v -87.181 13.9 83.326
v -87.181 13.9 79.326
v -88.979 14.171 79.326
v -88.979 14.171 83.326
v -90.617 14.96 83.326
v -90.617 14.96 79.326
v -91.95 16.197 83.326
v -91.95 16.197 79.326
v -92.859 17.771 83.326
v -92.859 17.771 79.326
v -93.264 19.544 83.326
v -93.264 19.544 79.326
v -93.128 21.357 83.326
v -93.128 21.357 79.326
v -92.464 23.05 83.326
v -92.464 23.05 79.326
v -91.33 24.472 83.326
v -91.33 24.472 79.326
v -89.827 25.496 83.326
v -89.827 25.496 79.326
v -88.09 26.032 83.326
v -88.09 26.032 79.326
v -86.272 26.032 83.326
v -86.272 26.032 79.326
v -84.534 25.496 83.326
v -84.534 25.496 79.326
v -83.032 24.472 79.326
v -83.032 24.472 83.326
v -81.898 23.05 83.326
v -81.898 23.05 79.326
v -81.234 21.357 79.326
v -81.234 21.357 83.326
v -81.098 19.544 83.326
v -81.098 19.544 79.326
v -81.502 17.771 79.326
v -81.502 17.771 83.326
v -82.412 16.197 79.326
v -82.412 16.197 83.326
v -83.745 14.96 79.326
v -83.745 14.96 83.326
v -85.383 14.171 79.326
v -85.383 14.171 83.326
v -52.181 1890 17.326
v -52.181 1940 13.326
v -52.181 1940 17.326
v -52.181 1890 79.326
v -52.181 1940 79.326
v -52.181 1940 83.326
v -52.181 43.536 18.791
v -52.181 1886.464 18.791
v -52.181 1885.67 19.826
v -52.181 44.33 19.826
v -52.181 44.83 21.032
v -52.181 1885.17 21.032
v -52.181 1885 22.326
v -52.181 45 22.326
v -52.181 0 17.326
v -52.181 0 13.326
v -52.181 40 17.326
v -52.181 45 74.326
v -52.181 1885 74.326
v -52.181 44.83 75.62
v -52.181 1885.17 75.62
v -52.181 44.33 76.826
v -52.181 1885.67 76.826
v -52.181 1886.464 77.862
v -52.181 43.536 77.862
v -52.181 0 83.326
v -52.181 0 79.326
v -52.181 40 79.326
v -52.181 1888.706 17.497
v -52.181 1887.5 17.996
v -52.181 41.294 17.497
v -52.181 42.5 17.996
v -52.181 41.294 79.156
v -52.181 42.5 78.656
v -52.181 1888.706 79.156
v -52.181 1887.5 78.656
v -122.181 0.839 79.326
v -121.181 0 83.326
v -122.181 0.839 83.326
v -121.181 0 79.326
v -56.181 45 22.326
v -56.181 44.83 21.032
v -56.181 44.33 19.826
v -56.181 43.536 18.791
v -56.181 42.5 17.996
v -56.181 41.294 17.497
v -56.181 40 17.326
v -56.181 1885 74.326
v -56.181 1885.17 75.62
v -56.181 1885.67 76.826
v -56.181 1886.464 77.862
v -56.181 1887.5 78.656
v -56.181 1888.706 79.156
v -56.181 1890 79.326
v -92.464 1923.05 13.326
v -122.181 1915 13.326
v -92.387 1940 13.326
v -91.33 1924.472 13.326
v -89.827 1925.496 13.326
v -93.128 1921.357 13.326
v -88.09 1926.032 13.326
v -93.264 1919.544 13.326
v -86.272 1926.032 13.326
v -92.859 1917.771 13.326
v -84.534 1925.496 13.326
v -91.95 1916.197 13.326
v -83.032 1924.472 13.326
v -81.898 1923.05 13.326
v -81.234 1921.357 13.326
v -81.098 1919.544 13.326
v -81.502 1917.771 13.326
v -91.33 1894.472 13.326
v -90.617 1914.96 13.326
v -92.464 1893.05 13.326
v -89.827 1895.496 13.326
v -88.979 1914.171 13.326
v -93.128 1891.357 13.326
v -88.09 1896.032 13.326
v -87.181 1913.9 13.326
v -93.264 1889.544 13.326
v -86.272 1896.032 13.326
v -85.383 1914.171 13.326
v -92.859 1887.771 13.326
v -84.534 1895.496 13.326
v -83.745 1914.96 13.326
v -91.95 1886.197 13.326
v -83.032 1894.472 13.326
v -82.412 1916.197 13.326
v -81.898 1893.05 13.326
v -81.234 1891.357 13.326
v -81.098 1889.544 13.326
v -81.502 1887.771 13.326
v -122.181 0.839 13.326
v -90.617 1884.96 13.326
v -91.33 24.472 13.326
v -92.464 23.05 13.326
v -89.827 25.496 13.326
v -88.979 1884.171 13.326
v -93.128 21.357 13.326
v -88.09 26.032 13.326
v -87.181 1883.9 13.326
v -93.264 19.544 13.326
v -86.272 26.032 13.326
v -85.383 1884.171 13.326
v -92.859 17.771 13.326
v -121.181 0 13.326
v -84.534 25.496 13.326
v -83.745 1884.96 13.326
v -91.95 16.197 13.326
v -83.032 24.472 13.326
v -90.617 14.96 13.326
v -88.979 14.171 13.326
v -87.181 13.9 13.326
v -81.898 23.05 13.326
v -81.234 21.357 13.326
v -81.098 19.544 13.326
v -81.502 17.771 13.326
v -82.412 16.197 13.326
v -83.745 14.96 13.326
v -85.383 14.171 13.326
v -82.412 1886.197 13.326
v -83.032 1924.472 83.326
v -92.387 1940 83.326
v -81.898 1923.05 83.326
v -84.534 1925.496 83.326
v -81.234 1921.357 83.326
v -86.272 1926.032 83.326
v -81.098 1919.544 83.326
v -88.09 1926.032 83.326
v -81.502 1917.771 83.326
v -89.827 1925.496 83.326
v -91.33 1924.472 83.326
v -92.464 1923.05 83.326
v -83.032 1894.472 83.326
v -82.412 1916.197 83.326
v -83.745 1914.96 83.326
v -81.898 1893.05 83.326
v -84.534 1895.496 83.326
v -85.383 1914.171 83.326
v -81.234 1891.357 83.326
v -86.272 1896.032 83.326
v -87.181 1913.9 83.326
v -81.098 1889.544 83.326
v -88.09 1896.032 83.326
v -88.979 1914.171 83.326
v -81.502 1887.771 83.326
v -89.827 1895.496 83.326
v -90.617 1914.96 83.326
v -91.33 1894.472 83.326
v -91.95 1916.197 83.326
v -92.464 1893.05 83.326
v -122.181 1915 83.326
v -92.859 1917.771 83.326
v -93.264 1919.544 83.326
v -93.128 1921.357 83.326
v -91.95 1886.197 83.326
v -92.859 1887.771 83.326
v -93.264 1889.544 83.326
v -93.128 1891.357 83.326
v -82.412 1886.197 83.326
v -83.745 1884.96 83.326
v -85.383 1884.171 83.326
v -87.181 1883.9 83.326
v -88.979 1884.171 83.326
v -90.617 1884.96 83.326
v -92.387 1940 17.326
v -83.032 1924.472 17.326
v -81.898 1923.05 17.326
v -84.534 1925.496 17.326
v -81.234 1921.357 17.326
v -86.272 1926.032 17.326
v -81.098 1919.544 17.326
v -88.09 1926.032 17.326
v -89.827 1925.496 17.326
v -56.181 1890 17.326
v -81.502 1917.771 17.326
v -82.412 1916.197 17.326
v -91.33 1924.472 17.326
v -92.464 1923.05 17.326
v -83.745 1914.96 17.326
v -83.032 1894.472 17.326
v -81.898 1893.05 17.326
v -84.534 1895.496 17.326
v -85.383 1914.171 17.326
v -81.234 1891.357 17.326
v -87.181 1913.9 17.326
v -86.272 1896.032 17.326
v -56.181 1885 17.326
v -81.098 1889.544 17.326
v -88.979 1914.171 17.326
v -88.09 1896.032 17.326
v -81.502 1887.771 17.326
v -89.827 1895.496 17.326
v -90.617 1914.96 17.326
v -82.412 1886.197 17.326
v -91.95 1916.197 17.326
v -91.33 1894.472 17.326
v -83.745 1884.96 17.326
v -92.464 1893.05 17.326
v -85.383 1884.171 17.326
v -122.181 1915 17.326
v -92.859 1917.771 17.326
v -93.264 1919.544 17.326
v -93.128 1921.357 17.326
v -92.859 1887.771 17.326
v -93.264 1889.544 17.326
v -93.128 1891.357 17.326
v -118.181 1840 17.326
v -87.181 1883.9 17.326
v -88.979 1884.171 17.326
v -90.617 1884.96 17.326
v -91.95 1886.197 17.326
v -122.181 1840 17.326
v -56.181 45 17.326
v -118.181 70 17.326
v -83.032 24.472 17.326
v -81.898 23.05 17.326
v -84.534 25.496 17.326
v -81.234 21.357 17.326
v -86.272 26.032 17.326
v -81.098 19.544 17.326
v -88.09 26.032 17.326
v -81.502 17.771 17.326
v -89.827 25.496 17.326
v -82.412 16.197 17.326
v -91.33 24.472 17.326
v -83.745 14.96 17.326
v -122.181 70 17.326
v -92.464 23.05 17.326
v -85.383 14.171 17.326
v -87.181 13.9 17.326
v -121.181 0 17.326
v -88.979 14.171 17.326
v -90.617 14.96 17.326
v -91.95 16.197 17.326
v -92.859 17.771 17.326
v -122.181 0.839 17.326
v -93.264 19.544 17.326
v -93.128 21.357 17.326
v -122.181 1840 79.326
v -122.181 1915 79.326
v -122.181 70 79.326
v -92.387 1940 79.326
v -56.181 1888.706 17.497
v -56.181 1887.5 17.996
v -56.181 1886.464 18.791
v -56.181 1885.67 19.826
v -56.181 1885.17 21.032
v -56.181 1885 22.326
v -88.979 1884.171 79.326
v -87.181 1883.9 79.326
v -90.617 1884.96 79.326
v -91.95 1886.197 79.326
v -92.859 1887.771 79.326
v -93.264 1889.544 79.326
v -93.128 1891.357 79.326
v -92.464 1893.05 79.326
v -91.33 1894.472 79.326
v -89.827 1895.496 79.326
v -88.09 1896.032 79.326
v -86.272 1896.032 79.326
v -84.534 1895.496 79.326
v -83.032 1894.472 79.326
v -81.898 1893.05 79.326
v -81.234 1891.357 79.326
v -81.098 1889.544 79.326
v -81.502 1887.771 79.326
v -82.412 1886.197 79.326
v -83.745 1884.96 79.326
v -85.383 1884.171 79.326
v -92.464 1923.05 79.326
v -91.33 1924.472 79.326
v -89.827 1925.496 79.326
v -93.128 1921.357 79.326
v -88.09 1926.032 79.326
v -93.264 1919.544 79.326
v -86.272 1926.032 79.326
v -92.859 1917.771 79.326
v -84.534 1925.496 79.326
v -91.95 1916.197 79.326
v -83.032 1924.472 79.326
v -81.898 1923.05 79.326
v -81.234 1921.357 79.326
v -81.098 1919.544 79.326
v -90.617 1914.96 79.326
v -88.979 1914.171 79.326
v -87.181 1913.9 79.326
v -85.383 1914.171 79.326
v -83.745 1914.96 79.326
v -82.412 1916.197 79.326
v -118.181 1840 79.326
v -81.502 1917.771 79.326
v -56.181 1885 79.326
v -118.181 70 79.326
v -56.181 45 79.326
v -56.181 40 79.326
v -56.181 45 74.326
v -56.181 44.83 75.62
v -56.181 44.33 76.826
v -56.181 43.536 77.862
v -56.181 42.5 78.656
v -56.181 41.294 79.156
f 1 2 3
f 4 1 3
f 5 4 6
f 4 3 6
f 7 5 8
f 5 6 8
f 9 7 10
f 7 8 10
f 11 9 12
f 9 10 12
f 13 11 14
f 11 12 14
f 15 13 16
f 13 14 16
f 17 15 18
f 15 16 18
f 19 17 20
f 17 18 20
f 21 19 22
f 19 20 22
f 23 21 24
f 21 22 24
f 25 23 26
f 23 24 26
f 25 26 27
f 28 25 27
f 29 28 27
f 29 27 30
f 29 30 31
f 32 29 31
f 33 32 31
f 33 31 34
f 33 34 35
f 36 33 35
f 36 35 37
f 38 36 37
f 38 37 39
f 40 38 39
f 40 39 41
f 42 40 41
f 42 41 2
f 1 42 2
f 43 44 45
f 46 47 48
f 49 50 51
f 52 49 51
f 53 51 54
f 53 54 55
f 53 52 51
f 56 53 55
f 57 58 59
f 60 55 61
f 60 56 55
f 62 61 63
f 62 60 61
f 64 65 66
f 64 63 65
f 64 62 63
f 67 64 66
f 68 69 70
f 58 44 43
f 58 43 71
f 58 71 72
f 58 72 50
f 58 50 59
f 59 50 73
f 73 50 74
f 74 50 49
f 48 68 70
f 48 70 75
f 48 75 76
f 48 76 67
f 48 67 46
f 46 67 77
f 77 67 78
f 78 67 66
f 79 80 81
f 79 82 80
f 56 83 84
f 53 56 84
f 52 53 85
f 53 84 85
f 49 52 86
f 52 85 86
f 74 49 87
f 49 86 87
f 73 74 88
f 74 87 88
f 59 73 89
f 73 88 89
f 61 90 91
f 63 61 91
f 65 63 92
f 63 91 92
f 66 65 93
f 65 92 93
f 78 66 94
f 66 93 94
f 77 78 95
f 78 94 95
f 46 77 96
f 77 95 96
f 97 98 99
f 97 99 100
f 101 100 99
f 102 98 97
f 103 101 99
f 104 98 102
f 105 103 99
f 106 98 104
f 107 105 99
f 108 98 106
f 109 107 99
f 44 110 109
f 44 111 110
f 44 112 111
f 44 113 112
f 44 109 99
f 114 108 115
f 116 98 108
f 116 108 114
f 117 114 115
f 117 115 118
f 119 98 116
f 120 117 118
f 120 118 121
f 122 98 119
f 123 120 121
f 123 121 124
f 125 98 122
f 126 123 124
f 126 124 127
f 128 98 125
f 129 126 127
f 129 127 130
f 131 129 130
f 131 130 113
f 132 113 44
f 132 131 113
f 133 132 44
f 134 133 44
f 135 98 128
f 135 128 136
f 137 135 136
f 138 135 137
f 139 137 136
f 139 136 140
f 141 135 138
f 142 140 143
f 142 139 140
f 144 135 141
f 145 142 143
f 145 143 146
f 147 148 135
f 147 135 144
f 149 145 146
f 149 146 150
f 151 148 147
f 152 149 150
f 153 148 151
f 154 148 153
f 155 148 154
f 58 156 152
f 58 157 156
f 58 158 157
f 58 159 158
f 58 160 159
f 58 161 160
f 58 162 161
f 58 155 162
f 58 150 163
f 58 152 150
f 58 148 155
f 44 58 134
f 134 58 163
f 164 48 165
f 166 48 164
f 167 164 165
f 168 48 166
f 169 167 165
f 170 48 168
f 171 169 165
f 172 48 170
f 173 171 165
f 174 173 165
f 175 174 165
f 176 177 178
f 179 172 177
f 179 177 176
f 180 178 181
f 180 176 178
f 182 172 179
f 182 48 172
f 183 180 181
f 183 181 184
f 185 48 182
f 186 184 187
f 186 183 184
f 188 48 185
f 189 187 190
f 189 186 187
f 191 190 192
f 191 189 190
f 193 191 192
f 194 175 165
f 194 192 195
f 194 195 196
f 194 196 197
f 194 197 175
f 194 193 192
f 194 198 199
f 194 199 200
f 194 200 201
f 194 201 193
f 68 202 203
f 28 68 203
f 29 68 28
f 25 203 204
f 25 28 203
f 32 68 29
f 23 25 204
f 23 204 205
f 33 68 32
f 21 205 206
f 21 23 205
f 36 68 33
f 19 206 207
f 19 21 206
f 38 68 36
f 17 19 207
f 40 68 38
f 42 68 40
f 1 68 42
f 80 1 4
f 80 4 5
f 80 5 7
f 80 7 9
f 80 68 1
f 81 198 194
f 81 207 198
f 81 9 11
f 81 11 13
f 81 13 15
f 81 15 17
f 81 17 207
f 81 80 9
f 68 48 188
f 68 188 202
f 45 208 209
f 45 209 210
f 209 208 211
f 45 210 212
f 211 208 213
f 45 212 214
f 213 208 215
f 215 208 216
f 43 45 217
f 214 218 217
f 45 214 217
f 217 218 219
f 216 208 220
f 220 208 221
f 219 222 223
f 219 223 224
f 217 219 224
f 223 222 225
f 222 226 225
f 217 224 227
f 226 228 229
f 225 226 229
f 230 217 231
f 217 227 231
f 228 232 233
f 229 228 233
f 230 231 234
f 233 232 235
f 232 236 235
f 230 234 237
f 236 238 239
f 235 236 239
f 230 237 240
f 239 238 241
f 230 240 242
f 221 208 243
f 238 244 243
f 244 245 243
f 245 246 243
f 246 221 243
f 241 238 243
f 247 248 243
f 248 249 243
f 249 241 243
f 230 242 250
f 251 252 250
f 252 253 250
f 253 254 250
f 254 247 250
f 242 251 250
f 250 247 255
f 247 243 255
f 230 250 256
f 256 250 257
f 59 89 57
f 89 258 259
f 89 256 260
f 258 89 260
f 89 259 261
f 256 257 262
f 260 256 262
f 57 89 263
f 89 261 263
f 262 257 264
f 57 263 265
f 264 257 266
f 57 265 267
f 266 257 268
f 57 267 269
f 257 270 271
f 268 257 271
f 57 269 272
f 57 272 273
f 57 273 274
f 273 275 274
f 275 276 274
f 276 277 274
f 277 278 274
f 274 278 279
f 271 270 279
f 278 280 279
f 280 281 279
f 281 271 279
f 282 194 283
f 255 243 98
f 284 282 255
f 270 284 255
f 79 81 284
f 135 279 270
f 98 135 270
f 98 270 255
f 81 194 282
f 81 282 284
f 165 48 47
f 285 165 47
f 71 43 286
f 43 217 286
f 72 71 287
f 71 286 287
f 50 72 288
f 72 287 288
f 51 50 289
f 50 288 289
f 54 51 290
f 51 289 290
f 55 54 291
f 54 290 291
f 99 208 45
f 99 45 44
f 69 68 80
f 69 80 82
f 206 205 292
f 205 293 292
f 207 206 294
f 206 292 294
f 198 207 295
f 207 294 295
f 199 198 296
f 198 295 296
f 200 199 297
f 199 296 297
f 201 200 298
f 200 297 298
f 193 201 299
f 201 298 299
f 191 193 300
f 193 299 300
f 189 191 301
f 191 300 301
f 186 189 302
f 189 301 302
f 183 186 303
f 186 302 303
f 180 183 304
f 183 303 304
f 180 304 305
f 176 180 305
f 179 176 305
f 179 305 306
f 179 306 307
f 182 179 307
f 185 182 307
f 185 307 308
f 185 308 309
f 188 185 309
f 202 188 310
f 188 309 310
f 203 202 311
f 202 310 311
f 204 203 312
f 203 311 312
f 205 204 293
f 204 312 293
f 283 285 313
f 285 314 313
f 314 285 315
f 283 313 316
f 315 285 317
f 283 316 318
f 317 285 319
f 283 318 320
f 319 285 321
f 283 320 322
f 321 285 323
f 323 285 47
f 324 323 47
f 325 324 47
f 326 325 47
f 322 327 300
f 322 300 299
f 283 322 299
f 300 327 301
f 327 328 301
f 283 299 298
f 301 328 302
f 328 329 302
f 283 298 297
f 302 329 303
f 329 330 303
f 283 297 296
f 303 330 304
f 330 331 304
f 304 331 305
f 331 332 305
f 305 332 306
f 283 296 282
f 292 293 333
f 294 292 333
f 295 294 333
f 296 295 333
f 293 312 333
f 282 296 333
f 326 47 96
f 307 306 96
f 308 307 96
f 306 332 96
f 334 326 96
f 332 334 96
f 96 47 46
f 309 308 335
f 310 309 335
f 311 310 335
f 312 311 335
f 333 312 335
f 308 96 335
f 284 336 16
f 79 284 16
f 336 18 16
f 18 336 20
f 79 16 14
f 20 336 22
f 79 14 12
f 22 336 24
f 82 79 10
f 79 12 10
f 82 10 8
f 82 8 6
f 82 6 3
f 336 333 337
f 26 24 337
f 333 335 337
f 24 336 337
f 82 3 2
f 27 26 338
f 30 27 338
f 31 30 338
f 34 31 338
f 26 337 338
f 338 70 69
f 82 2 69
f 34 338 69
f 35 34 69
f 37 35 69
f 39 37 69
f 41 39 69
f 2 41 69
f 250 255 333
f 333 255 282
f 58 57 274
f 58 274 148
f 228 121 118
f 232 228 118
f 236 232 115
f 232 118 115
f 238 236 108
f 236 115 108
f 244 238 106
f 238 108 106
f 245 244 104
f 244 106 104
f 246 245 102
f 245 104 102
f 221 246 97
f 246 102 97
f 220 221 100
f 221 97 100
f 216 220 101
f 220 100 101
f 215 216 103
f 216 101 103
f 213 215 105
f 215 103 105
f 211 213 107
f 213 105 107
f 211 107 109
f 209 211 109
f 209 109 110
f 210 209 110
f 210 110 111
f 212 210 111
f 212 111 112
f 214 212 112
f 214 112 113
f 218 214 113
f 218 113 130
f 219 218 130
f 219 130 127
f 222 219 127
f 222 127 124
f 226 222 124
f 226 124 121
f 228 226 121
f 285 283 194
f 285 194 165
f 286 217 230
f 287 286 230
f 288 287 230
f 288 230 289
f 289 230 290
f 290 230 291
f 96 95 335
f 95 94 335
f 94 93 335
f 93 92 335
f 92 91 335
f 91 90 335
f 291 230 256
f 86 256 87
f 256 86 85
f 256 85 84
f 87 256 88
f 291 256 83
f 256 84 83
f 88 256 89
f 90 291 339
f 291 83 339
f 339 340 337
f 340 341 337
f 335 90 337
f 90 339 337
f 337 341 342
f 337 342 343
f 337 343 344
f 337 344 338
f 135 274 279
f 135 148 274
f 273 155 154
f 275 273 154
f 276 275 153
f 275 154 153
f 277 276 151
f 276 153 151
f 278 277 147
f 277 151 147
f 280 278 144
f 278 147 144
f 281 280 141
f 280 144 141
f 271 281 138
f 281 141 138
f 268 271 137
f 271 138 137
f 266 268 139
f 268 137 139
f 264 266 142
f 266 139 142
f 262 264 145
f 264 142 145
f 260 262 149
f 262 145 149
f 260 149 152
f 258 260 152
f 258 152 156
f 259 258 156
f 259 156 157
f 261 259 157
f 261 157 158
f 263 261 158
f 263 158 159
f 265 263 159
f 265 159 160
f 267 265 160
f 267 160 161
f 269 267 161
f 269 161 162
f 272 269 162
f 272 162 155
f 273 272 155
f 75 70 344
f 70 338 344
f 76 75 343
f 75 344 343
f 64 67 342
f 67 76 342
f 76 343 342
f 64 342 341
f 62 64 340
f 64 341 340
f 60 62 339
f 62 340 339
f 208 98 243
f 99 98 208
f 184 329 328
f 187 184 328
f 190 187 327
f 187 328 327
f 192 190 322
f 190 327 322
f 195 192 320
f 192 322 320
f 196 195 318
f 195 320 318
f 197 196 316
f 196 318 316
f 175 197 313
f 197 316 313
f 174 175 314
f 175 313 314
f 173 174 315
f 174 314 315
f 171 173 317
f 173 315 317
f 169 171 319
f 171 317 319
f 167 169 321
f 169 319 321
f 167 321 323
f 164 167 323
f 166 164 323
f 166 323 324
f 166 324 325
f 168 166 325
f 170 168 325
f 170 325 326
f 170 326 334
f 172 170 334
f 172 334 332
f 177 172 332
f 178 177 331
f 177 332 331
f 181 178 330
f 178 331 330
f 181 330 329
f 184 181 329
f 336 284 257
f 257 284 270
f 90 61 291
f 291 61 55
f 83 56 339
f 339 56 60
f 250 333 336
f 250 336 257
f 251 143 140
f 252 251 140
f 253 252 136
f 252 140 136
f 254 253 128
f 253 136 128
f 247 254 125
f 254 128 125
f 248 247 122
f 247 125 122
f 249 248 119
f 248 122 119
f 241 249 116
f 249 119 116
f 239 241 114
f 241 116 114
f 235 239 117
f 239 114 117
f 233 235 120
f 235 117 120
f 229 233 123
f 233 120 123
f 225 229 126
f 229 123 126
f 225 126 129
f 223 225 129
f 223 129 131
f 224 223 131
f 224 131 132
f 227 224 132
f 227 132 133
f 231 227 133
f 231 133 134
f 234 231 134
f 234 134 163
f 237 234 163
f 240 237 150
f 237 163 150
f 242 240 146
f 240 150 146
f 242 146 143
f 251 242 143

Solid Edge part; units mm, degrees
sketch "Sketch1" plane through (0, 0, 0) normal (0, -1, 0) x (1, 0, 0)
  line L0 (-122.1808, 13.3262) -> (-52.1808, 13.3262)
  line L1 (-52.1808, 13.3262) -> (-52.1808, 83.3262)
  line L2 (-52.1808, 83.3262) -> (-122.1808, 83.3262)
  line L3 (-122.1808, 83.3262) -> (-122.1808, 13.3262)
  line L4 (-118.1808, 17.3262) -> (-56.1808, 17.3262)
  line L5 (-56.1808, 17.3262) -> (-56.1808, 79.3262)
  line L6 (-56.1808, 79.3262) -> (-118.1808, 79.3262)
  line L7 (-118.1808, 79.3262) -> (-118.1808, 17.3262)
  dimension "D1" = 70
  dimension "D2" = 70
  dimension "D3" = 4
  dimension "D4" = 4
extrude "Protrusion1" add sketch "Sketch1" against normal blind 1940
sketch "Sketch2" plane through (-87.1808, 1079, 13.3262) normal (0, 0, -1) x (0, -1, 0)
  circle A0 centre (-811, 0) radius 6.1
  circle A1 centre (-841, 0) radius 6.1
  circle A2 centre (1059, 0) radius 6.1
  dimension "D1" = 12.2
  dimension "D2" = 20
  dimension "D3" = 12.2
  dimension "D4" = 12.2
  dimension "D5" = 20
  dimension "D6" = 30
extrude "Cutout1" cut sketch "Sketch2" against normal through all
sketch "Sketch3" plane through (-52.1808, 1079, 63.3262) normal (1, 0, 0) x (0, -1, 0)
  line L0 (1034, -16) -> (1079, -16)
  line L1 (1079, -16) -> (1079, 46)
  line L2 (1079, 46) -> (1034, 46)
  line L3 (1034, 46) -> (1034, -16)
  line L4 (-861, -16) -> (-806, -16)
  line L5 (-806, -16) -> (-806, 46)
  line L6 (-806, 46) -> (-861, 46)
  line L7 (-861, 46) -> (-861, -16)
  dimension "D1" = 62
  dimension "D2" = 55
  dimension "D3" = 45
  dimension "D4" = 62
extrude "Cutout2" cut sketch "Sketch3" against normal up to next
sketch "Sketch4" plane through (-92.1808, 1005.1, 13.3262) normal (0, 0, -1) x (0, -1, 0)
  line L0 (-934.9, 30) -> (-909.9, 30)
  line L1 (-909.9, 30) -> (-934.9, 0.2062)
  line L2 (-934.9, 0.2062) -> (-934.9, 30)
  dimension "D1" = 25
extrude "Cutout3" cut sketch "Sketch4" against normal through all
sketch "Sketch5" plane through (-92.1808, 1005.1, 13.3262) normal (0, 0, -1) x (0, 1, 0)
  line L0 (-1005.1, -29) -> (-1004.2609, -30)
  line L1 (-1004.2609, -30) -> (-1005.1, -30)
  line L2 (-1005.1, -30) -> (-1005.1, -29)
  dimension "D1" = 1
extrude "Cutout4" cut sketch "Sketch5" against normal through all
sketch "Sketch6" plane through (-122.1808, 957.9195, 48.3262) normal (-1, 0, 0) x (0, -1, 0)
  line L0 (-982.0805, -31) -> (-882.0805, -31)
  line L1 (-882.0805, -31) -> (-882.0805, 31)
  line L2 (-882.0805, 31) -> (-982.0805, 31)
  line L3 (-982.0805, 31) -> (-982.0805, -31)
  dimension "D1" = 62
  dimension "D2" = 100
extrude "Cutout5" cut sketch "Sketch6" against normal up to next
sketch "Sketch7" plane through (-122.1808, 957.9195, 48.3262) normal (-1, 0, 0) x (0, 1, 0)
  line L0 (-957.9195, -31) -> (-887.9195, -31)
  line L1 (-887.9195, -31) -> (-887.9195, 31)
  line L2 (-887.9195, 31) -> (-957.9195, 31)
  line L3 (-957.9195, 31) -> (-957.9195, -31)
  dimension "D1" = 62
  dimension "D2" = 70
extrude "Cutout6" cut sketch "Sketch7" against normal up to next
fillet "Round1" radius 5 4 edges at (-54.1808, 45, 79.3262) (-54.1808, 45, 17.3262) (-54.1808, 1885, 79.3262) (-54.1808, 1885, 17.3262)
properties material "Aluminum, 6061-T6"
